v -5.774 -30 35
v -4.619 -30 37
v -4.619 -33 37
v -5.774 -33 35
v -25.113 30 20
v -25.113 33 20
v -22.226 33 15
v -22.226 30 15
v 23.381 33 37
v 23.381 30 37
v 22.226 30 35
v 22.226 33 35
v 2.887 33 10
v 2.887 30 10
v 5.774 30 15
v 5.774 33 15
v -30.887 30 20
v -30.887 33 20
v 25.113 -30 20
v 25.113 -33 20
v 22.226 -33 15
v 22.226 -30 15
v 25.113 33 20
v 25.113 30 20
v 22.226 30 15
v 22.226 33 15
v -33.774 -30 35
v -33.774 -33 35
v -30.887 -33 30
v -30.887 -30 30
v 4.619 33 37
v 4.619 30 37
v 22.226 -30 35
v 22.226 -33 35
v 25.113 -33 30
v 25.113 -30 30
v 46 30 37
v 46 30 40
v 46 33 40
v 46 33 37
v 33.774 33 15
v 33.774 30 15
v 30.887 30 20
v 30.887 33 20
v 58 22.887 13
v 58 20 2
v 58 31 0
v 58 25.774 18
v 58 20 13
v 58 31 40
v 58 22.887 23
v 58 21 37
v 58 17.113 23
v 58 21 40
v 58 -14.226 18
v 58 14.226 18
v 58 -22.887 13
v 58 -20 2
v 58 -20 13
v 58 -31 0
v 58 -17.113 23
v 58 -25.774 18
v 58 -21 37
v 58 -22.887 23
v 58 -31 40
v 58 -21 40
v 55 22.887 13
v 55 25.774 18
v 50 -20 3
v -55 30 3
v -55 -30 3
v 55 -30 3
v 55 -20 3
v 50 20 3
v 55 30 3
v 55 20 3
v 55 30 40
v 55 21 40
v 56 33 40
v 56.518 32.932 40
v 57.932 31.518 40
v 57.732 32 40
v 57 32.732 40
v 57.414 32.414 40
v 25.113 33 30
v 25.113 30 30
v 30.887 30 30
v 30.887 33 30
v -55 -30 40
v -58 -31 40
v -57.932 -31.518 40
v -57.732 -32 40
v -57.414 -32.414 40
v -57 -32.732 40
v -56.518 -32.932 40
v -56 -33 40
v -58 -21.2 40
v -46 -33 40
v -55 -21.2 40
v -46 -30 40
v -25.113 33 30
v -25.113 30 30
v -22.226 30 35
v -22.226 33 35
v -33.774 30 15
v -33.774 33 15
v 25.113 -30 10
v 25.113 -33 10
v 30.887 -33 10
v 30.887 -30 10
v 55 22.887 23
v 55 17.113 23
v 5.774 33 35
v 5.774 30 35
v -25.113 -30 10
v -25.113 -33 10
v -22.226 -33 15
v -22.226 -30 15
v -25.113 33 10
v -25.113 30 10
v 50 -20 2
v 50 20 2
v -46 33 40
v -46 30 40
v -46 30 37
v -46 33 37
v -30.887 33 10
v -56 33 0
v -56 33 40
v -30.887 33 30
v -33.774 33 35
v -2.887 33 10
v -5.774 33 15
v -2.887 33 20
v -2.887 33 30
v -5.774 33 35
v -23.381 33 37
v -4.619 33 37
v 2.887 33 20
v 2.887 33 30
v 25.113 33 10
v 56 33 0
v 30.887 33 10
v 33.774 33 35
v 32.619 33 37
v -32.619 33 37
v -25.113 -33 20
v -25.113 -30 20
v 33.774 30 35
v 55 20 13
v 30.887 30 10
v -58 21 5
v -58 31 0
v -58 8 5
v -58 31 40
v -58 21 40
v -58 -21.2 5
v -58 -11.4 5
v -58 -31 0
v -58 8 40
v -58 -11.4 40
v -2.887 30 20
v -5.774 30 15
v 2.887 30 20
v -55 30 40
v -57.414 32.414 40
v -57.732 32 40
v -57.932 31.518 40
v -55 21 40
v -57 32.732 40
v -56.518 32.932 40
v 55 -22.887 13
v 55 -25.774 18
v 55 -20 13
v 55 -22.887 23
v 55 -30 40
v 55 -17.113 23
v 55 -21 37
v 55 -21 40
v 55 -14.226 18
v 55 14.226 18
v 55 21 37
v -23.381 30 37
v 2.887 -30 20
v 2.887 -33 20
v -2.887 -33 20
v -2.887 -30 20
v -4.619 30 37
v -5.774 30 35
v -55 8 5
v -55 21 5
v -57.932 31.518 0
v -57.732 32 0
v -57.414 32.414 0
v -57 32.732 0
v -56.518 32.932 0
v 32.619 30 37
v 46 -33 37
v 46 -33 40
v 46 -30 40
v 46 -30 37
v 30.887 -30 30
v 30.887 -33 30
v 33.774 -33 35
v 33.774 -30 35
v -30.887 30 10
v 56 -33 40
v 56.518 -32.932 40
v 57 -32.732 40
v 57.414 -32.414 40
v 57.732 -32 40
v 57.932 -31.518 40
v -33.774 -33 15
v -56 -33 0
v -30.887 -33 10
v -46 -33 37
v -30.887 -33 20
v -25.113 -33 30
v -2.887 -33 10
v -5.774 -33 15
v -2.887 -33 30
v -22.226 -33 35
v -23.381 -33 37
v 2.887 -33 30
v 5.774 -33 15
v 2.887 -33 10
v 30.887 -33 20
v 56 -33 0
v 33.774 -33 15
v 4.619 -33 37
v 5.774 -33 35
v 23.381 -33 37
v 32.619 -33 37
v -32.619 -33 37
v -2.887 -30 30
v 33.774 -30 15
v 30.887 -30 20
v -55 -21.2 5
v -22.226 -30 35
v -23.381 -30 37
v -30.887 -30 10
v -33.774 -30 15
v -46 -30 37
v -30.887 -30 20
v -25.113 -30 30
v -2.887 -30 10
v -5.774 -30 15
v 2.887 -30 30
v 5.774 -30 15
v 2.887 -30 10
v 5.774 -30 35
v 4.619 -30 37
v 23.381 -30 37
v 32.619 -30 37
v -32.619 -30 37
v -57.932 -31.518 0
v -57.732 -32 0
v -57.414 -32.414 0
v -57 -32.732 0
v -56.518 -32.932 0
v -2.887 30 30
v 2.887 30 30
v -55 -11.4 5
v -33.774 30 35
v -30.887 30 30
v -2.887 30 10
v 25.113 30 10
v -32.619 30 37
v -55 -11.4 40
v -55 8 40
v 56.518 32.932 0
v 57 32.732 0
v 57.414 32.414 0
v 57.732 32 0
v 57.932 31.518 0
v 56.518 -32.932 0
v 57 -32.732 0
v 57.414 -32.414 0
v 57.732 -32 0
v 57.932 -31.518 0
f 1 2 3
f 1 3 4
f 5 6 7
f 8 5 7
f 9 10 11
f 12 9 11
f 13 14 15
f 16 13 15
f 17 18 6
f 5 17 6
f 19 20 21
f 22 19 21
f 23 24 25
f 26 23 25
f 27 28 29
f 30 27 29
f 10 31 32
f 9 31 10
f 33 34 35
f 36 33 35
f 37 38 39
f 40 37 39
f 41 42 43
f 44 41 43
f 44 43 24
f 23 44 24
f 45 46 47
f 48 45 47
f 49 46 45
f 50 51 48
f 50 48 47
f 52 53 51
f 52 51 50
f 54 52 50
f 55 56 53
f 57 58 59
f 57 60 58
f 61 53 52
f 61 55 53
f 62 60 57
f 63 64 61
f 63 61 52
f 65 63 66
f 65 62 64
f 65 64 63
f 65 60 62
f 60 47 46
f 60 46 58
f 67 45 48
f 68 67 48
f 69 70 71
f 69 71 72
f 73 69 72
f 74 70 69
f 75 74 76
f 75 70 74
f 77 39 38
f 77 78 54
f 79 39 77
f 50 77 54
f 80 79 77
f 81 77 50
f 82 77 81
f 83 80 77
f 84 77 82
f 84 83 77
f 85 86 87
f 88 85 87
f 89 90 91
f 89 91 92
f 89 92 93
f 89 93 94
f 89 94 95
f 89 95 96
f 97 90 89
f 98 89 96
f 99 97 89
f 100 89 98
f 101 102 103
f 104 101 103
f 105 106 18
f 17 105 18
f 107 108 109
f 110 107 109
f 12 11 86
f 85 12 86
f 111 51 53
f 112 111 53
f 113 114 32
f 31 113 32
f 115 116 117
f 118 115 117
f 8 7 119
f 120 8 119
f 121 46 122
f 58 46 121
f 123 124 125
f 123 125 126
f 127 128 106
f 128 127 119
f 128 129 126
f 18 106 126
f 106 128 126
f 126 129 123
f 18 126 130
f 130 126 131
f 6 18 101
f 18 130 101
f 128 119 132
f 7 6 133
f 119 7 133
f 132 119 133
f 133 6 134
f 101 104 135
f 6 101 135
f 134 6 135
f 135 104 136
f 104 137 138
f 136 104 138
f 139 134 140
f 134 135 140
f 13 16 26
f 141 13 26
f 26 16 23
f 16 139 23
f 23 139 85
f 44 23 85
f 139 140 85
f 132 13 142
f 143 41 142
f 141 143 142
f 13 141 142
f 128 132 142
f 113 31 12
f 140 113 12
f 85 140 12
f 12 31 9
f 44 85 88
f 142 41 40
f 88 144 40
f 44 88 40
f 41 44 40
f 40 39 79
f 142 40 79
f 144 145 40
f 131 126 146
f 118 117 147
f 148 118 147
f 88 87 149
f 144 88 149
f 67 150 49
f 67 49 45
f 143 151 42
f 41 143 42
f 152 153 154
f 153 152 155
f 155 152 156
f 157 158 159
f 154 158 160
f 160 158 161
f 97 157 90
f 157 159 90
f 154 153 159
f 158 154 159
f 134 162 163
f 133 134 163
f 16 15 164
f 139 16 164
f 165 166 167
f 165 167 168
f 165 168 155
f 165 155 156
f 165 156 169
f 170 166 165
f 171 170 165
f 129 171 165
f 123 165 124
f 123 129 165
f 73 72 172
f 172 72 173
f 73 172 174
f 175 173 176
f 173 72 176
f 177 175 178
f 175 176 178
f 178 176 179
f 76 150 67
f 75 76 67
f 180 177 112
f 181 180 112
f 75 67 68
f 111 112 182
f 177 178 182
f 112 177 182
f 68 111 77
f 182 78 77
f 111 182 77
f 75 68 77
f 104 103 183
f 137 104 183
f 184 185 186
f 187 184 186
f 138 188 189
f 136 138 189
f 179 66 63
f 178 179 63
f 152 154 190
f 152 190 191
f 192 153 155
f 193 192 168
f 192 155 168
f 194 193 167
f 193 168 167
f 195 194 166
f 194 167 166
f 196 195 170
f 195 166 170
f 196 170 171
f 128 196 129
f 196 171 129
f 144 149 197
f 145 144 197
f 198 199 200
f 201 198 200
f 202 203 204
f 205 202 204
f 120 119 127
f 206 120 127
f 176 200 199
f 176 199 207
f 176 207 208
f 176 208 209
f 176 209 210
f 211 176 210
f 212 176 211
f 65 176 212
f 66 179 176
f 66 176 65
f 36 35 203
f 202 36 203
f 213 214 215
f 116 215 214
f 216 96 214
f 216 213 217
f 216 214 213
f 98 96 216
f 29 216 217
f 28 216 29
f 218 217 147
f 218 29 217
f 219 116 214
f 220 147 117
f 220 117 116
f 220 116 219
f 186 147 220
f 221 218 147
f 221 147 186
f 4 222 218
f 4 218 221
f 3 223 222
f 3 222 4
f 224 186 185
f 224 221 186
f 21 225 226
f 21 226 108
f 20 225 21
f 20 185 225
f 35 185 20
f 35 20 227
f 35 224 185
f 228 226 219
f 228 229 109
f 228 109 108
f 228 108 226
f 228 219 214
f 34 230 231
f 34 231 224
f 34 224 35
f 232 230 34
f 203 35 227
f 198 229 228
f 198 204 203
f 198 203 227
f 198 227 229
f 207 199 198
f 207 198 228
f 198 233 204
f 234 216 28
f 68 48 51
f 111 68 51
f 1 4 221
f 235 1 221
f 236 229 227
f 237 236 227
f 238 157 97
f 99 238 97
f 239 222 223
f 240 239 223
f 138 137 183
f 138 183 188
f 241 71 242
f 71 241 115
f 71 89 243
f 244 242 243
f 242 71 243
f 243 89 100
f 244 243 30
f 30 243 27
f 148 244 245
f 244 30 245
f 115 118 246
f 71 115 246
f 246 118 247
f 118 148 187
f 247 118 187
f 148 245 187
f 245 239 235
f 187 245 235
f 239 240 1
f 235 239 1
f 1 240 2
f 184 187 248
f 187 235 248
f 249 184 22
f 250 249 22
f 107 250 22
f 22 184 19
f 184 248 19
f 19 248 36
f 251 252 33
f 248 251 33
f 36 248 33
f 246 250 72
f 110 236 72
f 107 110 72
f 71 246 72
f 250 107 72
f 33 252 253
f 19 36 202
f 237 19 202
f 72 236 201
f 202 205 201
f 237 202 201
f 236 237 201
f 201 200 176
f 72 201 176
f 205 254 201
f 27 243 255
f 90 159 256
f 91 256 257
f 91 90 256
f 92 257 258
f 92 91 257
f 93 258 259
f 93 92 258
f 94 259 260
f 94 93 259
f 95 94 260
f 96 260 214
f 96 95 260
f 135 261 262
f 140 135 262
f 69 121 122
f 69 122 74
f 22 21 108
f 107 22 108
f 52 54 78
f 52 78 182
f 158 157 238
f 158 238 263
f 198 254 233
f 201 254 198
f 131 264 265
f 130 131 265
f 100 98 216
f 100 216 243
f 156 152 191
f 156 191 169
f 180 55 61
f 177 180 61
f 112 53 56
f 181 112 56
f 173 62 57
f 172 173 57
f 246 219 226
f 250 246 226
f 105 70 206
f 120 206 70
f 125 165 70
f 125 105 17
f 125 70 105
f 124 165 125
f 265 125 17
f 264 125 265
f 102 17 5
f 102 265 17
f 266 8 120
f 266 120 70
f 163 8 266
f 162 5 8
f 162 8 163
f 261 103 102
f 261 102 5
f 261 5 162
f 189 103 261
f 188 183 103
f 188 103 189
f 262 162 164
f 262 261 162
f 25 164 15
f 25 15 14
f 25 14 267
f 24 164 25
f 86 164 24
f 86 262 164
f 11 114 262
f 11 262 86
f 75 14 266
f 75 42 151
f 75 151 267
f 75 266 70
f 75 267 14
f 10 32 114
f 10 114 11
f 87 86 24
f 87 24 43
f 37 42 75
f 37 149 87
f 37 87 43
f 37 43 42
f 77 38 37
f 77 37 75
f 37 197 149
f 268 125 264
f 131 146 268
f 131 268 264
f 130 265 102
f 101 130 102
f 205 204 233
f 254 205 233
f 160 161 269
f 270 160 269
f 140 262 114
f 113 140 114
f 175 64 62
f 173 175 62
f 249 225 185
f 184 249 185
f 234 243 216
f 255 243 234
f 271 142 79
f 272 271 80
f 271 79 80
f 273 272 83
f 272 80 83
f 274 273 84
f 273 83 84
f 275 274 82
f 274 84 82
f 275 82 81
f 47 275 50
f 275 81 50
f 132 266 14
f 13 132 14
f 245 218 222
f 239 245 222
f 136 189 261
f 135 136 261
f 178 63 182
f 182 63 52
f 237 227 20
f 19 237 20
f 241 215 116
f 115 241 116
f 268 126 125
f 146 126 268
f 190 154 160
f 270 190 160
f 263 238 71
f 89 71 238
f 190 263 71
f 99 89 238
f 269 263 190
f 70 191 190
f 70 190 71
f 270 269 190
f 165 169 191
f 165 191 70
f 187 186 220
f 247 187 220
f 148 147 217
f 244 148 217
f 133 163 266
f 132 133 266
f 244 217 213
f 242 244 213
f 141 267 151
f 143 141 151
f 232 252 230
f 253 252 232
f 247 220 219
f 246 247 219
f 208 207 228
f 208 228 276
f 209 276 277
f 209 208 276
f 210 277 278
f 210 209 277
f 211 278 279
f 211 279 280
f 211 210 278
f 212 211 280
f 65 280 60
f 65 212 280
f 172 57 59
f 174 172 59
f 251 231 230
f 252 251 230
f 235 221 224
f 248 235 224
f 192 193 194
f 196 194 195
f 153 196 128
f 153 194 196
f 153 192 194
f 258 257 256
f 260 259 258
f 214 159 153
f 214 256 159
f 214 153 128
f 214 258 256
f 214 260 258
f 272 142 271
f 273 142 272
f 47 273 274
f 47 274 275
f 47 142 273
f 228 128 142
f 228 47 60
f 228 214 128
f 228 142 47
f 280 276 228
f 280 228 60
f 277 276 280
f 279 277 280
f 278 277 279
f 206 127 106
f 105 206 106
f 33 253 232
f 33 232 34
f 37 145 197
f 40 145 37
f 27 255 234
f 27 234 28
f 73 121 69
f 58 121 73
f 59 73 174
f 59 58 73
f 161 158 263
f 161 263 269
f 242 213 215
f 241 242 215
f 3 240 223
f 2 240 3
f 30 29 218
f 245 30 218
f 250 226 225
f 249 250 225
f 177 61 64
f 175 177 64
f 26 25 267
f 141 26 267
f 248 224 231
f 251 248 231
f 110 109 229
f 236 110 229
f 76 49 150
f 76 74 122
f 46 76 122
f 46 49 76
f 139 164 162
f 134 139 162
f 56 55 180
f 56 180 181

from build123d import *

# Parameters (mm, degrees)
SKETCH_1_W           = 116
SKETCH_1_H           = 70
EXTRUDE_1_DEPTH      = 66
SKETCH_2_W           = 110
SKETCH_2_H           = 60
CUT_EXTRUDE_1_DEPTH  = 67
CUT_EXTRUDE_2_REACH  = 118
SKETCH_3_W           = 65
SKETCH_3_H           = 13
CUT_EXTRUDE_3_REACH  = 118
SKETCH_4_W           = 65
SKETCH_4_H           = 9.8
CUT_EXTRUDE_4_REACH  = 68
SKETCH_5_W           = 92
SKETCH_5_H           = 3
CUT_EXTRUDE_5_REACH  = 118
SKETCH_6_W           = 33
SKETCH_6_H           = 42
SKETCH_7_W           = 92
SKETCH_7_H           = 3
CUT_EXTRUDE_6_DEPTH  = 67
CUT_EXTRUDE_7_DEPTH  = 4
CUT_EXTRUDE_8_DEPTH  = 4
CUT_EXTRUDE_9_DEPTH  = 4
CUT_EXTRUDE_10_DEPTH = 4
CUT_EXTRUDE_11_DEPTH = 4
CUT_EXTRUDE_12_REACH = 118
CUT_EXTRUDE_13_DEPTH = 67
CUT_EXTRUDE_14_DEPTH = 67
CUT_EXTRUDE_15_DEPTH = 67
CUT_EXTRUDE_16_DEPTH = 67
CUT_EXTRUDE_17_DEPTH = 67
CUT_EXTRUDE_18_REACH = 68
CUT_EXTRUDE_19_REACH = 118
CUT_EXTRUDE_20_DEPTH = 67
FILLET_1_R           = 2
SKETCH_22_W          = 129.509915456
SKETCH_22_H          = 79.224014217
CUT_EXTRUDE_22_DEPTH = 30
SKETCH_23_W          = 92
SKETCH_23_H          = 66
CUT_EXTRUDE_23_DEPTH = 3
CUT_EXTRUDE_24_DEPTH = 8


with BuildPart() as part:
    # 스케치1 → 보스-돌출1 (new body)
    with BuildSketch(Plane.XZ.offset(33)):
        with Locations((0, 35)):
            Rectangle(SKETCH_1_W, SKETCH_1_H)
    extrude(amount=-EXTRUDE_1_DEPTH)

    # 스케치2 → 컷-돌출1 (cut)
    with BuildSketch(Plane.XY.offset(70)):
        Rectangle(SKETCH_2_W, SKETCH_2_H)
    extrude(amount=-CUT_EXTRUDE_1_DEPTH, mode=Mode.SUBTRACT)

    # 스케치3 → 컷-돌출2 (cut, up to next)
    with BuildSketch(Plane.ZY.offset(58), mode=Mode.PRIVATE) as cut_extrude_2_sk1:
        with Locations((37.5, 14.5)):
            Rectangle(SKETCH_3_W, SKETCH_3_H)
    cut_extrude_2_tool1 = extrude(cut_extrude_2_sk1.sketch, amount=-CUT_EXTRUDE_2_REACH, mode=Mode.PRIVATE) & part.part
    add(cut_extrude_2_tool1.solids().sort_by_distance((-58, 14.5, 37.5))[0], mode=Mode.SUBTRACT)

    # 스케치4 → 컷-돌출3 (cut, up to next)
    with BuildSketch(Plane.ZY.offset(58), mode=Mode.PRIVATE) as cut_extrude_3_sk1:
        with Locations((37.5, -16.3)):
            Rectangle(SKETCH_4_W, SKETCH_4_H)
    cut_extrude_3_tool1 = extrude(cut_extrude_3_sk1.sketch, amount=-CUT_EXTRUDE_3_REACH, mode=Mode.PRIVATE) & part.part
    add(cut_extrude_3_tool1.solids().sort_by_distance((-58, -16.3, 37.5))[0], mode=Mode.SUBTRACT)

    # 스케치5 → 컷-돌출4 (cut, up to next)
    with BuildSketch(Plane.XZ.offset(33), mode=Mode.PRIVATE) as cut_extrude_4_sk1:
        with Locations((0, 68.5)):
            Rectangle(SKETCH_5_W, SKETCH_5_H)
    cut_extrude_4_tool1 = extrude(cut_extrude_4_sk1.sketch, amount=-CUT_EXTRUDE_4_REACH, mode=Mode.PRIVATE) & part.part
    add(cut_extrude_4_tool1.solids().sort_by_distance((0, -33, 68.5))[0], mode=Mode.SUBTRACT)

    # 스케치6 → 컷-돌출5 (cut, up to next)
    with BuildSketch(Plane(origin=(58, 0, 0), x_dir=(0, 0, -1), z_dir=(1, 0, 0)), mode=Mode.PRIVATE) as cut_extrude_5_sk1:
        with Locations((-53.5, 0)):
            Rectangle(SKETCH_6_W, SKETCH_6_H)
    cut_extrude_5_tool1 = extrude(cut_extrude_5_sk1.sketch, amount=-CUT_EXTRUDE_5_REACH, mode=Mode.PRIVATE) & part.part
    add(cut_extrude_5_tool1.solids().sort_by_distance((58, 0, 53.5))[0], mode=Mode.SUBTRACT)

    # 스케치7 → 컷-돌출6 (cut, through all)
    with BuildSketch(Plane(origin=(0, 33, 0), x_dir=(-1, 0, 0), z_dir=(0, 1, 0))):
        with Locations((0, 68.5)):
            Rectangle(SKETCH_7_W, SKETCH_7_H)
    extrude(amount=-CUT_EXTRUDE_6_DEPTH, mode=Mode.SUBTRACT)

    # 스케치8 → 컷-돌출7 (cut, through all)
    with BuildSketch(Plane.XZ.offset(-30)):
        Polygon((-33.773502692, 35), (-30.886751346, 30), (-25.113248654, 30), (-22.226497308, 35), (-25.113248654, 40), (-30.886751346, 40), align=None)
    extrude(amount=-CUT_EXTRUDE_7_DEPTH, mode=Mode.SUBTRACT)

    # 스케치9 → 컷-돌출8 (cut, through all)
    with BuildSketch(Plane.XZ.offset(-30)):
        Polygon((-5.773502692, 35), (-2.886751346, 30), (2.886751346, 30), (5.773502692, 35), (2.886751346, 40), (-2.886751346, 40), align=None)
    extrude(amount=-CUT_EXTRUDE_8_DEPTH, mode=Mode.SUBTRACT)

    # 스케치10 → 컷-돌출9 (cut, through all)
    with BuildSketch(Plane.XZ.offset(-30)):
        Polygon((22.226497308, 35), (25.113248654, 30), (30.886751346, 30), (33.773502692, 35), (30.886751346, 40), (25.113248654, 40), align=None)
    extrude(amount=-CUT_EXTRUDE_9_DEPTH, mode=Mode.SUBTRACT)

    # 스케치11 → 컷-돌출10 (cut, through all)
    with BuildSketch(Plane.XZ.offset(-30)):
        Polygon((22.226497308, 15), (25.113248654, 10), (30.886751346, 10), (33.773502692, 15), (30.886751346, 20), (25.113248654, 20), align=None)
    extrude(amount=-CUT_EXTRUDE_10_DEPTH, mode=Mode.SUBTRACT)

    # 스케치12 → 컷-돌출11 (cut, through all)
    with BuildSketch(Plane.XZ.offset(-30)):
        Polygon((-5.773502692, 15), (-2.886751346, 10), (2.886751346, 10), (5.773502692, 15), (2.886751346, 20), (-2.886751346, 20), align=None)
    extrude(amount=-CUT_EXTRUDE_11_DEPTH, mode=Mode.SUBTRACT)

    # 스케치13 → 컷-돌출12 (cut, up to next)
    with BuildSketch(Plane(origin=(58, 0, 0), x_dir=(0, 0, -1), z_dir=(1, 0, 0)), mode=Mode.PRIVATE) as cut_extrude_12_sk1:
        Polygon((-23, -17.113248654), (-23, -22.886751346), (-18, -25.773502692), (-13, -22.886751346), (-13, -17.113248654), (-18, -14.226497308), align=None)
    cut_extrude_12_tool1 = extrude(cut_extrude_12_sk1.sketch, amount=-CUT_EXTRUDE_12_REACH, mode=Mode.PRIVATE) & part.part
    add(cut_extrude_12_tool1.solids().sort_by_distance((58, -20, 18))[0], mode=Mode.SUBTRACT)

    # 스케치14 → 컷-돌출13 (cut, through all)
    with BuildSketch(Plane.XZ.offset(33)):
        Polygon((-25.113248654, 40), (-30.886751346, 40), (-33.773502692, 35), (-30.886751346, 30), (-25.113248654, 30), (-22.226497308, 35), align=None)
    extrude(amount=-CUT_EXTRUDE_13_DEPTH, mode=Mode.SUBTRACT)

    # 스케치15 → 컷-돌출14 (cut, through all)
    with BuildSketch(Plane.XZ.offset(33)):
        Polygon((2.886751346, 40), (-2.886751346, 40), (-5.773502692, 35), (-2.886751346, 30), (2.886751346, 30), (5.773502692, 35), align=None)
    extrude(amount=-CUT_EXTRUDE_14_DEPTH, mode=Mode.SUBTRACT)

    # 스케치16 → 컷-돌출15 (cut, through all)
    with BuildSketch(Plane.XZ.offset(33)):
        Polygon((30.886751346, 40), (25.113248654, 40), (22.226497308, 35), (25.113248654, 30), (30.886751346, 30), (33.773502692, 35), align=None)
    extrude(amount=-CUT_EXTRUDE_15_DEPTH, mode=Mode.SUBTRACT)

    # 스케치17 → 컷-돌출16 (cut, through all)
    with BuildSketch(Plane.XZ.offset(33)):
        Polygon((30.886751346, 20), (25.113248654, 20), (22.226497308, 15), (25.113248654, 10), (30.886751346, 10), (33.773502692, 15), align=None)
    extrude(amount=-CUT_EXTRUDE_16_DEPTH, mode=Mode.SUBTRACT)

    # 스케치18 → 컷-돌출17 (cut, through all)
    with BuildSketch(Plane.XZ.offset(33)):
        Polygon((2.886751346, 20), (-2.886751346, 20), (-5.773502692, 15), (-2.886751346, 10), (2.886751346, 10), (5.773502692, 15), align=None)
    extrude(amount=-CUT_EXTRUDE_17_DEPTH, mode=Mode.SUBTRACT)

    # 스케치19 → 컷-돌출18 (cut, up to next)
    with BuildSketch(Plane.XZ.offset(33), mode=Mode.PRIVATE) as cut_extrude_18_sk1:
        Polygon((-25.113248654, 20), (-30.886751346, 20), (-33.773502692, 15), (-30.886751346, 10), (-25.113248654, 10), (-22.226497308, 15), align=None)
    cut_extrude_18_tool1 = extrude(cut_extrude_18_sk1.sketch, amount=-CUT_EXTRUDE_18_REACH, mode=Mode.PRIVATE) & part.part
    add(cut_extrude_18_tool1.solids().sort_by_distance((-28, -33, 15))[0], mode=Mode.SUBTRACT)

    # 스케치20 → 컷-돌출19 (cut, up to next)
    with BuildSketch(Plane(origin=(58, 0, 0), x_dir=(0, 0, -1), z_dir=(1, 0, 0)), mode=Mode.PRIVATE) as cut_extrude_19_sk1:
        Polygon((-18, 25.773502692), (-23, 22.886751346), (-23, 17.113248654), (-18, 14.226497308), (-13, 17.113248654), (-13, 22.886751346), align=None)
    cut_extrude_19_tool1 = extrude(cut_extrude_19_sk1.sketch, amount=-CUT_EXTRUDE_19_REACH, mode=Mode.PRIVATE) & part.part
    add(cut_extrude_19_tool1.solids().sort_by_distance((58, 20, 18))[0], mode=Mode.SUBTRACT)

    # 스케치21 → 컷-돌출20 (cut, through all)
    with BuildSketch(Plane(origin=(0, 33, 0), x_dir=(-1, 0, 0), z_dir=(0, 1, 0))):
        Polygon((22.226497308, 15), (25.113248654, 10), (30.886751346, 10), (33.773502692, 15), (30.886751346, 20), (25.113248654, 20), align=None)
    extrude(amount=-CUT_EXTRUDE_20_DEPTH, mode=Mode.SUBTRACT)

    # 필렛1
    fillet_1_edges = [part.edges().sort_by_distance(p)[0] for p in [
        (58, 33, 35),
        (-58, 33, 35),
        (58, -33, 35),
        (-58, -33, 35),
    ]]
    fillet(fillet_1_edges, radius=FILLET_1_R)

    # 스케치22 → 컷-돌출22 (cut)
    with BuildSketch(Plane.XY.offset(70)):
        with Locations((1.80270212, -0.616713883)):
            Rectangle(SKETCH_22_W, SKETCH_22_H)
    extrude(amount=-CUT_EXTRUDE_22_DEPTH, mode=Mode.SUBTRACT)

    # 스케치23 → 컷-돌출23 (cut)
    with BuildSketch(Plane.XY.offset(40)):
        Rectangle(SKETCH_23_W, SKETCH_23_H)
    extrude(amount=-CUT_EXTRUDE_23_DEPTH, mode=Mode.SUBTRACT)

    # 스케치24 → 컷-돌출24 (cut)
    with BuildSketch(Plane(origin=(58, 0, 0), x_dir=(0, 0, -1), z_dir=(1, 0, 0))):
        Polygon((-18, -14.226497308), (-18, 14.226497308), (-13, 20), (-2, 20), (-2, -20), (-13, -20), align=None)
    extrude(amount=-CUT_EXTRUDE_24_DEPTH, mode=Mode.SUBTRACT)


solid = part.part
